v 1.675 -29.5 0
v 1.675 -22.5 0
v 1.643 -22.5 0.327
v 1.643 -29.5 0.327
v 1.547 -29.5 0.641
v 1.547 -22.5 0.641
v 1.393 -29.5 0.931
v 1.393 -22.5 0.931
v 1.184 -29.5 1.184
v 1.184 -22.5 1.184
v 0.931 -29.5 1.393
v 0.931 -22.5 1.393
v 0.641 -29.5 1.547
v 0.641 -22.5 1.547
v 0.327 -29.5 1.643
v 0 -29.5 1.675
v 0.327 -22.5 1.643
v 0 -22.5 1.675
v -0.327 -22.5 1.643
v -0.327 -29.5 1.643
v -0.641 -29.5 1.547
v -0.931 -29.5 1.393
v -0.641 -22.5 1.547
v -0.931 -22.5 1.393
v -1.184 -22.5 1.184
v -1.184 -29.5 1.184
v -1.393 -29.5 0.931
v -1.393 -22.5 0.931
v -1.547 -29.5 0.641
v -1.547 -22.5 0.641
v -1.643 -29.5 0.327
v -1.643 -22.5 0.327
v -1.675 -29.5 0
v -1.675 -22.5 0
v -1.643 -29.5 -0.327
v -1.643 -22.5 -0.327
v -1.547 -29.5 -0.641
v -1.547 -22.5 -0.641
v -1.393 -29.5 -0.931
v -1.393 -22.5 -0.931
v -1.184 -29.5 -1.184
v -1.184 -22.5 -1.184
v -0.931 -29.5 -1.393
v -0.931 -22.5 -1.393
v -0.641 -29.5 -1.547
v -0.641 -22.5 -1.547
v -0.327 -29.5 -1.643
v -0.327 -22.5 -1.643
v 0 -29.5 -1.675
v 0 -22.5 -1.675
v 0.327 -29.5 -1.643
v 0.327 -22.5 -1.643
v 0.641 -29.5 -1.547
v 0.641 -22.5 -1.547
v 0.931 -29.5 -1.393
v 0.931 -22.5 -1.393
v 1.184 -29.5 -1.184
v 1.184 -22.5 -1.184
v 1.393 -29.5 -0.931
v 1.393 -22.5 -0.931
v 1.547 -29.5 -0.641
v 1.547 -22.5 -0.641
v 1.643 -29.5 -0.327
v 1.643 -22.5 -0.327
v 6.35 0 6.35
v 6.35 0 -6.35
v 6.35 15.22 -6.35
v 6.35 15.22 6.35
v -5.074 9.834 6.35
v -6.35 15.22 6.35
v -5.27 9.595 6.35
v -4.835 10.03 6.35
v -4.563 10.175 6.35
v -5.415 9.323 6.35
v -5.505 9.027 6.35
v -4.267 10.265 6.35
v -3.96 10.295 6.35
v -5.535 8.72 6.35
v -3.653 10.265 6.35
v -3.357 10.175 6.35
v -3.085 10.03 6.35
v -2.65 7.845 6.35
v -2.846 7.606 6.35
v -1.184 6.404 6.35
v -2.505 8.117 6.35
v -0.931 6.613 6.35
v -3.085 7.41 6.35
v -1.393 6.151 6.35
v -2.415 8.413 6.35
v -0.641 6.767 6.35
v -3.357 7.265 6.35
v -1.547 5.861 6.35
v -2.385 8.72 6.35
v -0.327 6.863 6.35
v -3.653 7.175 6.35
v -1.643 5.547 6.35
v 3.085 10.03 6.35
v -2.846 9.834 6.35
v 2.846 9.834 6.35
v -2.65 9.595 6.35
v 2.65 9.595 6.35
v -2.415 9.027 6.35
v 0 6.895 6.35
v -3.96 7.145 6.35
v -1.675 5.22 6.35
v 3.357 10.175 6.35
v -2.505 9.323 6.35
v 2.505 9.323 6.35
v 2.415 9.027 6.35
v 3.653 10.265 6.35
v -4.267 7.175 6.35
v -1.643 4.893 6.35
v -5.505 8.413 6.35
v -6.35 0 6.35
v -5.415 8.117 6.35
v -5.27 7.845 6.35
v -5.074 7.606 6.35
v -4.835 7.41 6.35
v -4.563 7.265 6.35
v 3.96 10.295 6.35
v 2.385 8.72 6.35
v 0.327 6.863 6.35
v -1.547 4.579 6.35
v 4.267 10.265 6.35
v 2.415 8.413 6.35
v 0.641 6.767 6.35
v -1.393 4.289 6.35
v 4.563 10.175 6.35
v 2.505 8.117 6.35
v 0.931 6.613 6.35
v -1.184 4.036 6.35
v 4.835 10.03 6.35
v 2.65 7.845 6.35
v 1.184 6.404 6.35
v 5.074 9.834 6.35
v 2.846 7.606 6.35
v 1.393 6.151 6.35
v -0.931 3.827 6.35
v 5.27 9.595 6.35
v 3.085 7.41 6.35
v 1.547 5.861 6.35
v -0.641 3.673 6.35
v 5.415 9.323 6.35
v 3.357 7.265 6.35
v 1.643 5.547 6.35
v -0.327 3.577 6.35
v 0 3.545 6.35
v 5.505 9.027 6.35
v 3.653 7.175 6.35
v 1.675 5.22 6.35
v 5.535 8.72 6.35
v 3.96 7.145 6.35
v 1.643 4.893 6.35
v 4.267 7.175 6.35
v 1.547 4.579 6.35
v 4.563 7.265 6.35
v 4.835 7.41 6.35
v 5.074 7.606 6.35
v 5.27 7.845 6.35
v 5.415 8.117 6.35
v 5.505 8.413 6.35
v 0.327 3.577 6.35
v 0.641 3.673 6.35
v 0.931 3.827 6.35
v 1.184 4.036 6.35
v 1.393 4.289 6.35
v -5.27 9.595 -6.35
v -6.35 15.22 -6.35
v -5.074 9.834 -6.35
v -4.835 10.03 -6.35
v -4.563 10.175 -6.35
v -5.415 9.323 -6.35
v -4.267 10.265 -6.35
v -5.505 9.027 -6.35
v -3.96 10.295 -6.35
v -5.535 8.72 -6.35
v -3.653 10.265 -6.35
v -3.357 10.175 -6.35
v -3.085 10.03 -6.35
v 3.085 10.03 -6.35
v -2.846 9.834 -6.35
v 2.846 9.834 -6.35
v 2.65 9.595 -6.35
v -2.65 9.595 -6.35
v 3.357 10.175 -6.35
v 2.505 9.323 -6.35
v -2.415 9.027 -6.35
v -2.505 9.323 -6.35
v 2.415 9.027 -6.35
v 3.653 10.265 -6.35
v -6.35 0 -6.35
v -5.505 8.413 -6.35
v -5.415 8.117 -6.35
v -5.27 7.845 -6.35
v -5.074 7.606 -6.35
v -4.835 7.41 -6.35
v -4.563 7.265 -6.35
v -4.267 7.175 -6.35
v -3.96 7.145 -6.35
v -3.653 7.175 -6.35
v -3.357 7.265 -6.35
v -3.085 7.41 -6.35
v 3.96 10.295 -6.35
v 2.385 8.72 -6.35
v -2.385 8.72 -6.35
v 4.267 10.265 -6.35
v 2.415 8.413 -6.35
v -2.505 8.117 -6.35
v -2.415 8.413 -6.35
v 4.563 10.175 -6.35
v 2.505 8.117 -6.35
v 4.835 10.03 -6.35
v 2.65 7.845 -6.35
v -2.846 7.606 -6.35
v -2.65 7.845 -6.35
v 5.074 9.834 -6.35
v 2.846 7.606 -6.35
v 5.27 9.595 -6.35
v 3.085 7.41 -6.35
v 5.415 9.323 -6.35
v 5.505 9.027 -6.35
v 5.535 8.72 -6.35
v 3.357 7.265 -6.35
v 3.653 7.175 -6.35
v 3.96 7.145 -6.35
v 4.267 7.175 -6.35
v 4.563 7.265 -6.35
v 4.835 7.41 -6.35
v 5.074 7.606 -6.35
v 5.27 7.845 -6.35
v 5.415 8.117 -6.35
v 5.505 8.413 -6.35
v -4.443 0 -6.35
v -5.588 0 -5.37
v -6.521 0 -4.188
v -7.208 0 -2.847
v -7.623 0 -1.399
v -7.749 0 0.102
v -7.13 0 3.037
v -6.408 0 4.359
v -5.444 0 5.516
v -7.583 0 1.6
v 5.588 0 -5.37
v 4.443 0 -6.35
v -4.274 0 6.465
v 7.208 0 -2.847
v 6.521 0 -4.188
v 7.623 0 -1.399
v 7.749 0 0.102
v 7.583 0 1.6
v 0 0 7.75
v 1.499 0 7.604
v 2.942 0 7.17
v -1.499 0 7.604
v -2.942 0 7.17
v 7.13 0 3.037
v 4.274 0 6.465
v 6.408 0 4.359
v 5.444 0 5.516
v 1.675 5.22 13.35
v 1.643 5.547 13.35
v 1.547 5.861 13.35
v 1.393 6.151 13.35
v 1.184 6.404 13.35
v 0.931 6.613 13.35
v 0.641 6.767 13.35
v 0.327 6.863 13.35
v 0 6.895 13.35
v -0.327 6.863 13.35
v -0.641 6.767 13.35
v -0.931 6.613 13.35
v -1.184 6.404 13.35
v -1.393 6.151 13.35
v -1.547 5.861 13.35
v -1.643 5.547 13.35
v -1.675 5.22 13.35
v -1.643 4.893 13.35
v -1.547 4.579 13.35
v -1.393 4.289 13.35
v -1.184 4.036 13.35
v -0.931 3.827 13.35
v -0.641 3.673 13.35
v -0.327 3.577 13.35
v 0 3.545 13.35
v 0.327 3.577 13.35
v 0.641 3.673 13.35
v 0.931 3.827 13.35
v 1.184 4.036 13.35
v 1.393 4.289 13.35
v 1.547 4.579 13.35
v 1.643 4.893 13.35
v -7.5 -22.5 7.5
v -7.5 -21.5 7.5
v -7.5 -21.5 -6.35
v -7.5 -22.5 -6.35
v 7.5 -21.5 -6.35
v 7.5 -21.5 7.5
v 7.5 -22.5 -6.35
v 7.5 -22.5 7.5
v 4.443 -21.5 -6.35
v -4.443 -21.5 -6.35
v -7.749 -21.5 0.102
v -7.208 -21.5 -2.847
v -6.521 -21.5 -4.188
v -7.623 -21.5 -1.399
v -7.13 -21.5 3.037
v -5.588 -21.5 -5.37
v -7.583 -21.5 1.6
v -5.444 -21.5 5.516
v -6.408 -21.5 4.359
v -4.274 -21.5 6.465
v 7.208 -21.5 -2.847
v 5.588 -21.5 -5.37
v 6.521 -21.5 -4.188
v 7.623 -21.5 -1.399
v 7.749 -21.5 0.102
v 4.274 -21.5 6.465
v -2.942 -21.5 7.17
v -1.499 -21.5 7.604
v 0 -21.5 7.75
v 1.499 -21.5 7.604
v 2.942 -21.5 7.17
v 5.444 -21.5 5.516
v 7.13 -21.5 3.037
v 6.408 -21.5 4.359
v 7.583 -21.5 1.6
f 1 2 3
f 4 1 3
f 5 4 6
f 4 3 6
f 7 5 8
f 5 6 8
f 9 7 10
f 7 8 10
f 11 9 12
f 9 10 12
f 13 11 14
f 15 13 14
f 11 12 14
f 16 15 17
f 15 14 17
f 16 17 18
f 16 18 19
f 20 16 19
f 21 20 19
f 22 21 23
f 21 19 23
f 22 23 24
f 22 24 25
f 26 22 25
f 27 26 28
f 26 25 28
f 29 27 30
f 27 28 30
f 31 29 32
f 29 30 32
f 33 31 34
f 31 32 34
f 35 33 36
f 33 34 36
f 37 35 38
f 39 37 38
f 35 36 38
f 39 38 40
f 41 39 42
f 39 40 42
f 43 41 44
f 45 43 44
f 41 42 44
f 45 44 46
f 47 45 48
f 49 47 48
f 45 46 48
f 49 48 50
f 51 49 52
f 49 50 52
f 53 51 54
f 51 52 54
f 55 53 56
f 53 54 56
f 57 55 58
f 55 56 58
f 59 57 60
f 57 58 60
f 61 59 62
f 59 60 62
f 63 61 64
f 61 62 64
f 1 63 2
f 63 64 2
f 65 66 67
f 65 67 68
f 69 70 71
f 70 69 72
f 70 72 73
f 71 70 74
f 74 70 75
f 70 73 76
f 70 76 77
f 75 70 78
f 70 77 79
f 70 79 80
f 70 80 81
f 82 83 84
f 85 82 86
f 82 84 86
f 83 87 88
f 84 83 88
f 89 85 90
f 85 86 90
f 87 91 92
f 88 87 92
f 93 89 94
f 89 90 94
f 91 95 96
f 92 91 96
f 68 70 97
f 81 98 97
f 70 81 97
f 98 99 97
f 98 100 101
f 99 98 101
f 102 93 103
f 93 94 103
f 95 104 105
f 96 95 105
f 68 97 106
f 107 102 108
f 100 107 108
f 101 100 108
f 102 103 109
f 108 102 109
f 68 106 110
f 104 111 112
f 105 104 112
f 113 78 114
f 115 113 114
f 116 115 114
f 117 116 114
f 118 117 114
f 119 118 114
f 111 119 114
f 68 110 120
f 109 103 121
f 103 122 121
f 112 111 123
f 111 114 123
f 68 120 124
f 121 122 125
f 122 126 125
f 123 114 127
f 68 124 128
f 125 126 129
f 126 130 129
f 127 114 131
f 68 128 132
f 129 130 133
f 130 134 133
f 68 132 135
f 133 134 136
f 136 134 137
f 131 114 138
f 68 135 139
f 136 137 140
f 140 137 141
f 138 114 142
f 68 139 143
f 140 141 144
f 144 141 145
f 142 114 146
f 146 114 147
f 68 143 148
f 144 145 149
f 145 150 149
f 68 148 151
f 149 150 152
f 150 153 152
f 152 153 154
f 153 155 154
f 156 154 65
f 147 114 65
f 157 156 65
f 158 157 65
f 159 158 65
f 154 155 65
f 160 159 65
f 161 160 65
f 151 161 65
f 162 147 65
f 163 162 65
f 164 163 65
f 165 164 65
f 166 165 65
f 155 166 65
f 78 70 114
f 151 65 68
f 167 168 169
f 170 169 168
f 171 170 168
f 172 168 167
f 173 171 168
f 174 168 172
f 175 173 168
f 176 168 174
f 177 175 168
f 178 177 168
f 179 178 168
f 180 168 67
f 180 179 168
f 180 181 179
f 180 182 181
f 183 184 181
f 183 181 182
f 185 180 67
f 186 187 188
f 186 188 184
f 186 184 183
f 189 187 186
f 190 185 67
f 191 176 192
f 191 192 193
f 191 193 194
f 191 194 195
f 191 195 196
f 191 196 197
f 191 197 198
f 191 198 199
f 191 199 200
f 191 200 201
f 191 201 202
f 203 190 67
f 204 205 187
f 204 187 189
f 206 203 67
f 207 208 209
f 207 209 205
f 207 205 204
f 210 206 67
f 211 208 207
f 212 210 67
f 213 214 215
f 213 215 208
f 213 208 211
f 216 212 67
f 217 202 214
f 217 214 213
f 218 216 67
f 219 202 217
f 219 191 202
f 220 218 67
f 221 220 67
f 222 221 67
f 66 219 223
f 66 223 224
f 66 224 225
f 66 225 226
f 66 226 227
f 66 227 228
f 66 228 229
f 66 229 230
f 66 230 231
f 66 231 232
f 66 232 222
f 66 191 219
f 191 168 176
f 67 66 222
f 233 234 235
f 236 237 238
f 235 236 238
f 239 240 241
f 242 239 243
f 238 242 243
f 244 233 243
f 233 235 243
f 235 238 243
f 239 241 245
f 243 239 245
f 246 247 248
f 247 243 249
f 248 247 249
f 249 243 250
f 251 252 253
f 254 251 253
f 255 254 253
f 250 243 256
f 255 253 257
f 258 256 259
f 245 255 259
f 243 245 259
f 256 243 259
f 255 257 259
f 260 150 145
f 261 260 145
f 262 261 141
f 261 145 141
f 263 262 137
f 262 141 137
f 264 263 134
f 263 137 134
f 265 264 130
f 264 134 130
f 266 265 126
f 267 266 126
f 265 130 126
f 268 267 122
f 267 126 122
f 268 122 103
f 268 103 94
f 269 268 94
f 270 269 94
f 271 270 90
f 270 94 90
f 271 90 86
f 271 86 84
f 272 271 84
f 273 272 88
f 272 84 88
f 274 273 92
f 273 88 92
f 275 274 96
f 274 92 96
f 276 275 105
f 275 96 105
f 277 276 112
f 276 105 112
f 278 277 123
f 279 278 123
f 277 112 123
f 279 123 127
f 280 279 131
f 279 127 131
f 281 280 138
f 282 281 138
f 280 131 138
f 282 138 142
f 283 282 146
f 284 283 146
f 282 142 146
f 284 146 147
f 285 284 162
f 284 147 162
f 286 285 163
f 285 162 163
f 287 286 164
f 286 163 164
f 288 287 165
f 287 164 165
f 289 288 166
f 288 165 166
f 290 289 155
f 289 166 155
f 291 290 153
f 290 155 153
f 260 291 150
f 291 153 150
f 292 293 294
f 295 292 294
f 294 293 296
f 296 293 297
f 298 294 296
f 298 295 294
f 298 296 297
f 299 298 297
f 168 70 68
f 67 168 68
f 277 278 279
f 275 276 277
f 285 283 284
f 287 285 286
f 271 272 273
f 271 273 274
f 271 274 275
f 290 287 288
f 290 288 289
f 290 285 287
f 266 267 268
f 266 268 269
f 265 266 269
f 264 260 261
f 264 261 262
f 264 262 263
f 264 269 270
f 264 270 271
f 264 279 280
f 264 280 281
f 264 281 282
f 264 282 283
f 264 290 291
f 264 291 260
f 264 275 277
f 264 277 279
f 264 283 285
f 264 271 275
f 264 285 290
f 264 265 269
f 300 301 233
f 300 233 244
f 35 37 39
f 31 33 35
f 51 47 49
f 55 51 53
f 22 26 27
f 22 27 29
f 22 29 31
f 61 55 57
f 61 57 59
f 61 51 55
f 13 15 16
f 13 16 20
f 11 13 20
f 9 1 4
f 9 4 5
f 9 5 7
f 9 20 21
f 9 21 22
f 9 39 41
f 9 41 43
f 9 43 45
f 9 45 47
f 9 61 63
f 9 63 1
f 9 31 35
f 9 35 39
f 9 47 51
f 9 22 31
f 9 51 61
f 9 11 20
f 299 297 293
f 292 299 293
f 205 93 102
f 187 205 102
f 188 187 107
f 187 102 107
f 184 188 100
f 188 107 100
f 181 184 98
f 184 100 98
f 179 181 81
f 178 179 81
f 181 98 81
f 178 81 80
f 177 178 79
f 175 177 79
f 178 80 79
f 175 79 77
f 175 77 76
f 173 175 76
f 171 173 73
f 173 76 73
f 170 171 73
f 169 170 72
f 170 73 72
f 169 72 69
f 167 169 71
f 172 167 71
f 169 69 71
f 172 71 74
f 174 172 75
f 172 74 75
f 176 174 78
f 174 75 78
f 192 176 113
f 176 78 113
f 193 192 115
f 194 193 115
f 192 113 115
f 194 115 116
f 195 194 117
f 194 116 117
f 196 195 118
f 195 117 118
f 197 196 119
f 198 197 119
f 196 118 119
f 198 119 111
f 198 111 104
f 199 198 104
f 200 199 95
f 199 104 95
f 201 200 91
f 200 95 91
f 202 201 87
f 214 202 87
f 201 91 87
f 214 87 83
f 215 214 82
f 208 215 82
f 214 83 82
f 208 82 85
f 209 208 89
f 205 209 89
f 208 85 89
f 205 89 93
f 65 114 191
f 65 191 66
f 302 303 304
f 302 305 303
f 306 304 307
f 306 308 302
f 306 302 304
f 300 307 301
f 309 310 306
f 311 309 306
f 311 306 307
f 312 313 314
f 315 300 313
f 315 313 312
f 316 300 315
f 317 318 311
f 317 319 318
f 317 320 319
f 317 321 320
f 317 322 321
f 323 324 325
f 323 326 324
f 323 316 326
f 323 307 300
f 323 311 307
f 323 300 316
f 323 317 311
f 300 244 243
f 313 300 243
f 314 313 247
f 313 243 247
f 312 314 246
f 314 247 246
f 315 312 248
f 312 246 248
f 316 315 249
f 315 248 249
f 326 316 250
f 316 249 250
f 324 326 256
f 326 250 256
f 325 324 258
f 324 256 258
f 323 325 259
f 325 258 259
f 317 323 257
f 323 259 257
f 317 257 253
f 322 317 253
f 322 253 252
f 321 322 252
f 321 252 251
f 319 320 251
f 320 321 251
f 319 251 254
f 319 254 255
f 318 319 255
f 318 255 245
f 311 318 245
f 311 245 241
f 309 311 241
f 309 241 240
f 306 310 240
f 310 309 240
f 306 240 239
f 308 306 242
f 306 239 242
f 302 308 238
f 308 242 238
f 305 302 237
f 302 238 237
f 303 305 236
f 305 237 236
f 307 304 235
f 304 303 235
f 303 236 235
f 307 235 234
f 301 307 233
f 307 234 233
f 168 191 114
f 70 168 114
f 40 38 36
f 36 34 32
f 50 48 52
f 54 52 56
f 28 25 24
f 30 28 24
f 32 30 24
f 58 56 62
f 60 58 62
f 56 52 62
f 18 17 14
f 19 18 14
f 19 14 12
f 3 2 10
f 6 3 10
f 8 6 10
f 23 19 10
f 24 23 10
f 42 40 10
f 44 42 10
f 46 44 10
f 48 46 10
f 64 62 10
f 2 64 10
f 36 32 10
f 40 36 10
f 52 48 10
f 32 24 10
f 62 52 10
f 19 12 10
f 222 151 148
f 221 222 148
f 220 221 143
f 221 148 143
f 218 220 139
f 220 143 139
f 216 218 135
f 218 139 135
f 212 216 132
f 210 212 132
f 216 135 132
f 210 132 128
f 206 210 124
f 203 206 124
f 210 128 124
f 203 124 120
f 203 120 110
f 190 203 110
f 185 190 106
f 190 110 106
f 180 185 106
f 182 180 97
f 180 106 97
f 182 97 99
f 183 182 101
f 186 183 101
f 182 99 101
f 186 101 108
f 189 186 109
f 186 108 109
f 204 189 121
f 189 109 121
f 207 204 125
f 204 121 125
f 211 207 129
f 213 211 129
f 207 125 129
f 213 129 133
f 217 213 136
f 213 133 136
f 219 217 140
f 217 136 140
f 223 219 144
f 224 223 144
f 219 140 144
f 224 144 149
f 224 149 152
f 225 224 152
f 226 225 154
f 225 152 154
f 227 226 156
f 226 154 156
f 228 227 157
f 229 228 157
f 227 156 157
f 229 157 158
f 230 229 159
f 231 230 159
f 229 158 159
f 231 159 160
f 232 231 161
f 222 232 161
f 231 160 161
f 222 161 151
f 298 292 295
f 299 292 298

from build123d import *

# Parameters (mm, degrees)
F0_W      = 12.7
F0_H      = 12.7
F1_DEPTH  = 15.22
F2_R      = 1.575
F3_DEPTH  = 12.7
F4_R      = 1.675
F5_DEPTH  = 7
F6_R      = 7.75
F7_DEPTH  = 21.5
F9_DEPTH  = 1
F10_R     = 1.675
F11_DEPTH = 7
F12_W     = 18.3020820841
F12_H     = 46.3375374675
F13_DEPTH = 25


with BuildPart() as f1:
    # F0 (on Front) → F1 (new body)
    with BuildSketch(Plane.XZ):
        Rectangle(F0_W, F0_H)
    extrude(amount=-F1_DEPTH)

    # F2 (on face) → F3 (cut, through all)
    with BuildSketch(Plane.XY.offset(6.35)):
        with Locations((-3.96, 8.72)):
            Circle(F2_R)
        with Locations((3.96, 8.72)):
            Circle(F2_R)
    extrude(amount=-F3_DEPTH, mode=Mode.SUBTRACT)

    # F4 (on face) → F5 (join)
    with BuildSketch(Plane.XY.offset(6.35)):
        with Locations((0, 5.22)):
            Circle(F4_R)
    extrude(amount=F5_DEPTH)


with BuildPart() as f7:
    # F6 (on face) → F7 (new body)
    with BuildSketch(Plane.XZ):
        Circle(F6_R)
    extrude(amount=F7_DEPTH)


with BuildPart() as f9:
    # F8 (on face) → F9 (new body)
    with BuildSketch(Plane.XZ.offset(21.5)):
        with BuildLine():
            ThreePointArc((7.5, 1.952562419), (5.4800775542, 5.4800775542), (1.952562419, 7.5))
            Line((1.952562419, 7.5), (-1.952562419, 7.5))
            ThreePointArc((-1.952562419, 7.5), (-5.4800775542, 5.4800775542), (-7.5, 1.952562419))
            Line((-7.5, 1.952562419), (-7.5, -1.952562419))
            ThreePointArc((-7.5, -1.952562419), (-5.4800775542, -5.4800775542), (-1.952562419, -7.5))
            Line((-1.952562419, -7.5), (1.952562419, -7.5))
            ThreePointArc((1.952562419, -7.5), (5.4800775542, -5.4800775542), (7.5, -1.952562419))
            Line((7.5, -1.952562419), (7.5, 1.952562419))
        make_face()
        with BuildLine():
            Line((7.5, 1.952562419), (7.5, 7.5))
            Line((7.5, 7.5), (1.952562419, 7.5))
            ThreePointArc((1.952562419, 7.5), (5.4800775542, 5.4800775542), (7.5, 1.952562419))
        make_face()
        with BuildLine():
            ThreePointArc((-7.5, 1.952562419), (-5.4800775542, 5.4800775542), (-1.952562419, 7.5))
            Line((-1.952562419, 7.5), (-7.5, 7.5))
            Line((-7.5, 7.5), (-7.5, 1.952562419))
        make_face()
        with BuildLine():
            Line((7.5, -7.5), (7.5, -1.952562419))
            ThreePointArc((7.5, -1.952562419), (5.4800775542, -5.4800775542), (1.952562419, -7.5))
            Line((1.952562419, -7.5), (7.5, -7.5))
        make_face()
        with BuildLine():
            ThreePointArc((-1.952562419, -7.5), (-5.4800775542, -5.4800775542), (-7.5, -1.952562419))
            Line((-7.5, -1.952562419), (-7.5, -7.5))
            Line((-7.5, -7.5), (-1.952562419, -7.5))
        make_face()
    extrude(amount=F9_DEPTH)


with BuildPart() as f11:
    # F10 (on face) → F11 (new body)
    with BuildSketch(Plane.XZ.offset(22.5)):
        Circle(F10_R)
    extrude(amount=F11_DEPTH)


with BuildPart() as f13_tool:
    # F12 (on face) → F13 (new body)
    with BuildSketch(Plane(origin=(0, 0, -6.35), x_dir=(1, 0, 0), z_dir=(0, 0, -1))):
        with Locations((-0.3079646267, 3.9059985429)):
            Rectangle(F12_W, F12_H)
    extrude(amount=F13_DEPTH)


with BuildPart() as f7_1:
    add(f7.part)

    # F13: cut by f13_tool
    add(f13_tool.part, mode=Mode.SUBTRACT)


with BuildPart() as f9_1:
    add(f9.part)

    # F13: cut by f13_tool
    add(f13_tool.part, mode=Mode.SUBTRACT)


solid = Compound([f1.part, f11.part, f7_1.part, f9_1.part])
